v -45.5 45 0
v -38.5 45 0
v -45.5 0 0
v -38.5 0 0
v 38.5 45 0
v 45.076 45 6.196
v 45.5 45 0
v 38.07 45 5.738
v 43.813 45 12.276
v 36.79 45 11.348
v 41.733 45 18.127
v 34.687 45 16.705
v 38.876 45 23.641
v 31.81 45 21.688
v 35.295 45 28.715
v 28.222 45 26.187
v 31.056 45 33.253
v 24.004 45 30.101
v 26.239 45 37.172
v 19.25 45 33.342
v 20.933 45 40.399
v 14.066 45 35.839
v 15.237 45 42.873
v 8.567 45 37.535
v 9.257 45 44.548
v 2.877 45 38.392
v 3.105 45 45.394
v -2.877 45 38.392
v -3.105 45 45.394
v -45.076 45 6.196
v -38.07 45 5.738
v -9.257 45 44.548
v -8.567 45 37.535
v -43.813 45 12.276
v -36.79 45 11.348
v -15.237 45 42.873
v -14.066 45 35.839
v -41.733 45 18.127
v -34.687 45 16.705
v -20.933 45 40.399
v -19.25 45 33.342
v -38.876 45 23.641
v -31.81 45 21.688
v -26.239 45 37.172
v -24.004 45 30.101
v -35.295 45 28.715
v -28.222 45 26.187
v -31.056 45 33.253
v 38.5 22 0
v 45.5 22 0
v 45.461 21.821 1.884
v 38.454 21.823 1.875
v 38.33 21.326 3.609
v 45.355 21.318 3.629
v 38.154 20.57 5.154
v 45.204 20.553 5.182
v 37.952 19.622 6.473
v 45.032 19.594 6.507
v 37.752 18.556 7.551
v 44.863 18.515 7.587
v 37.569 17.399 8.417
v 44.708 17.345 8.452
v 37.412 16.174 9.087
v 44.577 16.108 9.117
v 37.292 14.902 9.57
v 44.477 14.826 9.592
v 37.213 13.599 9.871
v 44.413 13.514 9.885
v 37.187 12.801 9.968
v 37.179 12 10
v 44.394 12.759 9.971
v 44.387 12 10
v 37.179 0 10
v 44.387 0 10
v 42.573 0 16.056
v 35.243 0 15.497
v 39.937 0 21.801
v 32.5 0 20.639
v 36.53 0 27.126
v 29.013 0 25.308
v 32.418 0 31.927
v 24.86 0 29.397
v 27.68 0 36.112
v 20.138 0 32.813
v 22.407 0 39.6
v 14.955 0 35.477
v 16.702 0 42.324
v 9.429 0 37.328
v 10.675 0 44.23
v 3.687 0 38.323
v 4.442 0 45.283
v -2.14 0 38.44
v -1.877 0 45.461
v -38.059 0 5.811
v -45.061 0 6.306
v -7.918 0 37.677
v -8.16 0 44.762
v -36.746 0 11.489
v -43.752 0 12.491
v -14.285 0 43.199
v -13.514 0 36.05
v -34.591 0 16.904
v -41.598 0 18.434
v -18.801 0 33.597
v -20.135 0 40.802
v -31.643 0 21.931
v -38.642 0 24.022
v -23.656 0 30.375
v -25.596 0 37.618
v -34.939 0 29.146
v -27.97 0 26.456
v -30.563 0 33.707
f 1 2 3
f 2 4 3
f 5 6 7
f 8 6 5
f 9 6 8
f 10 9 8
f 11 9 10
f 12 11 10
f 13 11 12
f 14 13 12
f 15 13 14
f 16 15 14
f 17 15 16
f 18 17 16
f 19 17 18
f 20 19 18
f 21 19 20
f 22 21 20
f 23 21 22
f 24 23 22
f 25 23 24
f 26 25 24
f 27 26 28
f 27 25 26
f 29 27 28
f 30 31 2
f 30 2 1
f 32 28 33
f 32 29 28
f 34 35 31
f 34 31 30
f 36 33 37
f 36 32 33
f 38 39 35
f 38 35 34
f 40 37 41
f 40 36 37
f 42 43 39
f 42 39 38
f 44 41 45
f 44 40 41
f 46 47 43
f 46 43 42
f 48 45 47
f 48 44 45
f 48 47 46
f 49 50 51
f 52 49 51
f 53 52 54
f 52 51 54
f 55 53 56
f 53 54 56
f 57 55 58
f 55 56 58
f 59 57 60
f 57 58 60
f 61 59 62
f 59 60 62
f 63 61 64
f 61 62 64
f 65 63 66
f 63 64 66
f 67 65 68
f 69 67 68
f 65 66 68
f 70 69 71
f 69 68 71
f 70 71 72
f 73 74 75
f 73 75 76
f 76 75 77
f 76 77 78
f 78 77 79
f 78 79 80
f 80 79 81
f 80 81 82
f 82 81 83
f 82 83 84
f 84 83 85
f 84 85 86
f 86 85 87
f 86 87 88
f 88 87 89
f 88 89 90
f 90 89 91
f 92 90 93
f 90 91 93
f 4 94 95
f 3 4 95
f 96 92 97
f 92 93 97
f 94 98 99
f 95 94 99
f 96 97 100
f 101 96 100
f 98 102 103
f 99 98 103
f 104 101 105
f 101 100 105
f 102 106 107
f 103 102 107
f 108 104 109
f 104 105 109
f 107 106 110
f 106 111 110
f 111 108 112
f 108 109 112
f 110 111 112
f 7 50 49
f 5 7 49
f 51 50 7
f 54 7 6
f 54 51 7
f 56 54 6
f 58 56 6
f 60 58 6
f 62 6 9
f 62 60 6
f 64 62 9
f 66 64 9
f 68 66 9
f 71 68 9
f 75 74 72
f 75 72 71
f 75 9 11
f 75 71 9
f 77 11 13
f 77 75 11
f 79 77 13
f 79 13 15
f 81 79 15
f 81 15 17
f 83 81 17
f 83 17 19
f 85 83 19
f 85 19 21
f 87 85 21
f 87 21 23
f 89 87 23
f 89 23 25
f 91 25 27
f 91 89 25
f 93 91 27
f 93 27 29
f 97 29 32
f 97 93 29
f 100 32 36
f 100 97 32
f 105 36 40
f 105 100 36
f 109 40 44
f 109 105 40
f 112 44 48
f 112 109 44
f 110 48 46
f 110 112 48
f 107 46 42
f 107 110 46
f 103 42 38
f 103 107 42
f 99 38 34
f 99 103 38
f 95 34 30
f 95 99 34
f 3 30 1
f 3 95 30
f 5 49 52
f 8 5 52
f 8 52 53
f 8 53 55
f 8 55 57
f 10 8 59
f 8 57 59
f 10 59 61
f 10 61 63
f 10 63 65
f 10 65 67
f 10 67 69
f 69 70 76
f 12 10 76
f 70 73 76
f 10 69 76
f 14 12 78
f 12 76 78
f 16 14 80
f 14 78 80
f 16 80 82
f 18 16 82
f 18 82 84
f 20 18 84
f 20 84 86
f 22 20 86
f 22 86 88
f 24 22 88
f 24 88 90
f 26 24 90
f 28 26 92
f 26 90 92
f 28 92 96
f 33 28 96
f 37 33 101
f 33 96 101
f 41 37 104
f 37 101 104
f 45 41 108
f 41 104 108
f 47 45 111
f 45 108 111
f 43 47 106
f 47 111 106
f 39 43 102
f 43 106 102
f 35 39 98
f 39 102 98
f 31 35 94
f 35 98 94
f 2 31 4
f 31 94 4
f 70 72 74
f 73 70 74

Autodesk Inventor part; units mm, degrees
ref_plane "YZ Plane" through (0, 0, 0) normal (1, 0, 0) x (0, 1, 0)
ref_plane "XZ Plane" through (0, 0, 0) normal (0, 1, 0) x (-1, 0, 0)
ref_plane "XY Plane" through (0, 0, 0) normal (0, 0, 1) x (1, 0, 0)
sketch "Sketch1" plane through (0, 0, 0) normal (0, 1, 0) x (-1, 0, 0)
  circle A0 centre (0, 0) radius 45.5
  circle A1 centre (0, 0) radius 38.5
  line L0 (-45.5, 0) -> (-38.5, 0)
  line L1 (38.5, 0) -> (45.5, 0)
  dimension "d1" = 7
  dimension "d4" = 91
extrude "Extrusion1" add sketch "Sketch1" along normal blind 45 contours L1 A1 L0 A0 picked at (-42.8352, 3.1533)
ref_plane "Work Plane1" through (45.5, 0, 0) normal (1, 0, 0) x (0, 1, 0)
sketch "Sketch2" plane through (45.5, 0, 0) normal (1, 0, 0) x (0, 1, 0)
  arc A0 (22, 0) -> (12, 10) centre (12, 0) ccw
  line L0 (0, 0) -> (0, 45.5) projected
  line L1 (0, 0) -> (45, 0) projected
  line L2 (22, 0) -> (22, 0)
  line L3 (0, 0) -> (45, 0) projected
  line L4 (2, 0) -> (2, 0)
  line L5 (22, 0) -> (2, 0)
  line L6 (12, 10) -> (0, 10)
  line L7 (0, 38.5) -> (0, 0) projected
  line L8 (0, 10) -> (0, 0)
  line L9 (0, 0) -> (12, 0)
  dimension "d7" = 20
  dimension "KisFogaskerekBesulyesztese" = 12
  dimension "d9" = 0
extrude "Extrusion2" cut sketch "Sketch2" against normal blind 50
equation "\"d1\" = PVCfalVastagsag"
equation "\"d4\" = KulsoAtmeroPVCcso"
equation "\"KisFogaskerekBesulyesztese\" = KisFogaskerekBesulyesztes"
equation "\"PVCfalVastagsag\" = 7"
equation "\"KulsoAtmeroPVCcso\" = 91"
equation "\"KisFogaskerekBesulyesztes\" = 12"
properties part number "BurkolatPVCszenzorFedel" material "PVC-Piping"
